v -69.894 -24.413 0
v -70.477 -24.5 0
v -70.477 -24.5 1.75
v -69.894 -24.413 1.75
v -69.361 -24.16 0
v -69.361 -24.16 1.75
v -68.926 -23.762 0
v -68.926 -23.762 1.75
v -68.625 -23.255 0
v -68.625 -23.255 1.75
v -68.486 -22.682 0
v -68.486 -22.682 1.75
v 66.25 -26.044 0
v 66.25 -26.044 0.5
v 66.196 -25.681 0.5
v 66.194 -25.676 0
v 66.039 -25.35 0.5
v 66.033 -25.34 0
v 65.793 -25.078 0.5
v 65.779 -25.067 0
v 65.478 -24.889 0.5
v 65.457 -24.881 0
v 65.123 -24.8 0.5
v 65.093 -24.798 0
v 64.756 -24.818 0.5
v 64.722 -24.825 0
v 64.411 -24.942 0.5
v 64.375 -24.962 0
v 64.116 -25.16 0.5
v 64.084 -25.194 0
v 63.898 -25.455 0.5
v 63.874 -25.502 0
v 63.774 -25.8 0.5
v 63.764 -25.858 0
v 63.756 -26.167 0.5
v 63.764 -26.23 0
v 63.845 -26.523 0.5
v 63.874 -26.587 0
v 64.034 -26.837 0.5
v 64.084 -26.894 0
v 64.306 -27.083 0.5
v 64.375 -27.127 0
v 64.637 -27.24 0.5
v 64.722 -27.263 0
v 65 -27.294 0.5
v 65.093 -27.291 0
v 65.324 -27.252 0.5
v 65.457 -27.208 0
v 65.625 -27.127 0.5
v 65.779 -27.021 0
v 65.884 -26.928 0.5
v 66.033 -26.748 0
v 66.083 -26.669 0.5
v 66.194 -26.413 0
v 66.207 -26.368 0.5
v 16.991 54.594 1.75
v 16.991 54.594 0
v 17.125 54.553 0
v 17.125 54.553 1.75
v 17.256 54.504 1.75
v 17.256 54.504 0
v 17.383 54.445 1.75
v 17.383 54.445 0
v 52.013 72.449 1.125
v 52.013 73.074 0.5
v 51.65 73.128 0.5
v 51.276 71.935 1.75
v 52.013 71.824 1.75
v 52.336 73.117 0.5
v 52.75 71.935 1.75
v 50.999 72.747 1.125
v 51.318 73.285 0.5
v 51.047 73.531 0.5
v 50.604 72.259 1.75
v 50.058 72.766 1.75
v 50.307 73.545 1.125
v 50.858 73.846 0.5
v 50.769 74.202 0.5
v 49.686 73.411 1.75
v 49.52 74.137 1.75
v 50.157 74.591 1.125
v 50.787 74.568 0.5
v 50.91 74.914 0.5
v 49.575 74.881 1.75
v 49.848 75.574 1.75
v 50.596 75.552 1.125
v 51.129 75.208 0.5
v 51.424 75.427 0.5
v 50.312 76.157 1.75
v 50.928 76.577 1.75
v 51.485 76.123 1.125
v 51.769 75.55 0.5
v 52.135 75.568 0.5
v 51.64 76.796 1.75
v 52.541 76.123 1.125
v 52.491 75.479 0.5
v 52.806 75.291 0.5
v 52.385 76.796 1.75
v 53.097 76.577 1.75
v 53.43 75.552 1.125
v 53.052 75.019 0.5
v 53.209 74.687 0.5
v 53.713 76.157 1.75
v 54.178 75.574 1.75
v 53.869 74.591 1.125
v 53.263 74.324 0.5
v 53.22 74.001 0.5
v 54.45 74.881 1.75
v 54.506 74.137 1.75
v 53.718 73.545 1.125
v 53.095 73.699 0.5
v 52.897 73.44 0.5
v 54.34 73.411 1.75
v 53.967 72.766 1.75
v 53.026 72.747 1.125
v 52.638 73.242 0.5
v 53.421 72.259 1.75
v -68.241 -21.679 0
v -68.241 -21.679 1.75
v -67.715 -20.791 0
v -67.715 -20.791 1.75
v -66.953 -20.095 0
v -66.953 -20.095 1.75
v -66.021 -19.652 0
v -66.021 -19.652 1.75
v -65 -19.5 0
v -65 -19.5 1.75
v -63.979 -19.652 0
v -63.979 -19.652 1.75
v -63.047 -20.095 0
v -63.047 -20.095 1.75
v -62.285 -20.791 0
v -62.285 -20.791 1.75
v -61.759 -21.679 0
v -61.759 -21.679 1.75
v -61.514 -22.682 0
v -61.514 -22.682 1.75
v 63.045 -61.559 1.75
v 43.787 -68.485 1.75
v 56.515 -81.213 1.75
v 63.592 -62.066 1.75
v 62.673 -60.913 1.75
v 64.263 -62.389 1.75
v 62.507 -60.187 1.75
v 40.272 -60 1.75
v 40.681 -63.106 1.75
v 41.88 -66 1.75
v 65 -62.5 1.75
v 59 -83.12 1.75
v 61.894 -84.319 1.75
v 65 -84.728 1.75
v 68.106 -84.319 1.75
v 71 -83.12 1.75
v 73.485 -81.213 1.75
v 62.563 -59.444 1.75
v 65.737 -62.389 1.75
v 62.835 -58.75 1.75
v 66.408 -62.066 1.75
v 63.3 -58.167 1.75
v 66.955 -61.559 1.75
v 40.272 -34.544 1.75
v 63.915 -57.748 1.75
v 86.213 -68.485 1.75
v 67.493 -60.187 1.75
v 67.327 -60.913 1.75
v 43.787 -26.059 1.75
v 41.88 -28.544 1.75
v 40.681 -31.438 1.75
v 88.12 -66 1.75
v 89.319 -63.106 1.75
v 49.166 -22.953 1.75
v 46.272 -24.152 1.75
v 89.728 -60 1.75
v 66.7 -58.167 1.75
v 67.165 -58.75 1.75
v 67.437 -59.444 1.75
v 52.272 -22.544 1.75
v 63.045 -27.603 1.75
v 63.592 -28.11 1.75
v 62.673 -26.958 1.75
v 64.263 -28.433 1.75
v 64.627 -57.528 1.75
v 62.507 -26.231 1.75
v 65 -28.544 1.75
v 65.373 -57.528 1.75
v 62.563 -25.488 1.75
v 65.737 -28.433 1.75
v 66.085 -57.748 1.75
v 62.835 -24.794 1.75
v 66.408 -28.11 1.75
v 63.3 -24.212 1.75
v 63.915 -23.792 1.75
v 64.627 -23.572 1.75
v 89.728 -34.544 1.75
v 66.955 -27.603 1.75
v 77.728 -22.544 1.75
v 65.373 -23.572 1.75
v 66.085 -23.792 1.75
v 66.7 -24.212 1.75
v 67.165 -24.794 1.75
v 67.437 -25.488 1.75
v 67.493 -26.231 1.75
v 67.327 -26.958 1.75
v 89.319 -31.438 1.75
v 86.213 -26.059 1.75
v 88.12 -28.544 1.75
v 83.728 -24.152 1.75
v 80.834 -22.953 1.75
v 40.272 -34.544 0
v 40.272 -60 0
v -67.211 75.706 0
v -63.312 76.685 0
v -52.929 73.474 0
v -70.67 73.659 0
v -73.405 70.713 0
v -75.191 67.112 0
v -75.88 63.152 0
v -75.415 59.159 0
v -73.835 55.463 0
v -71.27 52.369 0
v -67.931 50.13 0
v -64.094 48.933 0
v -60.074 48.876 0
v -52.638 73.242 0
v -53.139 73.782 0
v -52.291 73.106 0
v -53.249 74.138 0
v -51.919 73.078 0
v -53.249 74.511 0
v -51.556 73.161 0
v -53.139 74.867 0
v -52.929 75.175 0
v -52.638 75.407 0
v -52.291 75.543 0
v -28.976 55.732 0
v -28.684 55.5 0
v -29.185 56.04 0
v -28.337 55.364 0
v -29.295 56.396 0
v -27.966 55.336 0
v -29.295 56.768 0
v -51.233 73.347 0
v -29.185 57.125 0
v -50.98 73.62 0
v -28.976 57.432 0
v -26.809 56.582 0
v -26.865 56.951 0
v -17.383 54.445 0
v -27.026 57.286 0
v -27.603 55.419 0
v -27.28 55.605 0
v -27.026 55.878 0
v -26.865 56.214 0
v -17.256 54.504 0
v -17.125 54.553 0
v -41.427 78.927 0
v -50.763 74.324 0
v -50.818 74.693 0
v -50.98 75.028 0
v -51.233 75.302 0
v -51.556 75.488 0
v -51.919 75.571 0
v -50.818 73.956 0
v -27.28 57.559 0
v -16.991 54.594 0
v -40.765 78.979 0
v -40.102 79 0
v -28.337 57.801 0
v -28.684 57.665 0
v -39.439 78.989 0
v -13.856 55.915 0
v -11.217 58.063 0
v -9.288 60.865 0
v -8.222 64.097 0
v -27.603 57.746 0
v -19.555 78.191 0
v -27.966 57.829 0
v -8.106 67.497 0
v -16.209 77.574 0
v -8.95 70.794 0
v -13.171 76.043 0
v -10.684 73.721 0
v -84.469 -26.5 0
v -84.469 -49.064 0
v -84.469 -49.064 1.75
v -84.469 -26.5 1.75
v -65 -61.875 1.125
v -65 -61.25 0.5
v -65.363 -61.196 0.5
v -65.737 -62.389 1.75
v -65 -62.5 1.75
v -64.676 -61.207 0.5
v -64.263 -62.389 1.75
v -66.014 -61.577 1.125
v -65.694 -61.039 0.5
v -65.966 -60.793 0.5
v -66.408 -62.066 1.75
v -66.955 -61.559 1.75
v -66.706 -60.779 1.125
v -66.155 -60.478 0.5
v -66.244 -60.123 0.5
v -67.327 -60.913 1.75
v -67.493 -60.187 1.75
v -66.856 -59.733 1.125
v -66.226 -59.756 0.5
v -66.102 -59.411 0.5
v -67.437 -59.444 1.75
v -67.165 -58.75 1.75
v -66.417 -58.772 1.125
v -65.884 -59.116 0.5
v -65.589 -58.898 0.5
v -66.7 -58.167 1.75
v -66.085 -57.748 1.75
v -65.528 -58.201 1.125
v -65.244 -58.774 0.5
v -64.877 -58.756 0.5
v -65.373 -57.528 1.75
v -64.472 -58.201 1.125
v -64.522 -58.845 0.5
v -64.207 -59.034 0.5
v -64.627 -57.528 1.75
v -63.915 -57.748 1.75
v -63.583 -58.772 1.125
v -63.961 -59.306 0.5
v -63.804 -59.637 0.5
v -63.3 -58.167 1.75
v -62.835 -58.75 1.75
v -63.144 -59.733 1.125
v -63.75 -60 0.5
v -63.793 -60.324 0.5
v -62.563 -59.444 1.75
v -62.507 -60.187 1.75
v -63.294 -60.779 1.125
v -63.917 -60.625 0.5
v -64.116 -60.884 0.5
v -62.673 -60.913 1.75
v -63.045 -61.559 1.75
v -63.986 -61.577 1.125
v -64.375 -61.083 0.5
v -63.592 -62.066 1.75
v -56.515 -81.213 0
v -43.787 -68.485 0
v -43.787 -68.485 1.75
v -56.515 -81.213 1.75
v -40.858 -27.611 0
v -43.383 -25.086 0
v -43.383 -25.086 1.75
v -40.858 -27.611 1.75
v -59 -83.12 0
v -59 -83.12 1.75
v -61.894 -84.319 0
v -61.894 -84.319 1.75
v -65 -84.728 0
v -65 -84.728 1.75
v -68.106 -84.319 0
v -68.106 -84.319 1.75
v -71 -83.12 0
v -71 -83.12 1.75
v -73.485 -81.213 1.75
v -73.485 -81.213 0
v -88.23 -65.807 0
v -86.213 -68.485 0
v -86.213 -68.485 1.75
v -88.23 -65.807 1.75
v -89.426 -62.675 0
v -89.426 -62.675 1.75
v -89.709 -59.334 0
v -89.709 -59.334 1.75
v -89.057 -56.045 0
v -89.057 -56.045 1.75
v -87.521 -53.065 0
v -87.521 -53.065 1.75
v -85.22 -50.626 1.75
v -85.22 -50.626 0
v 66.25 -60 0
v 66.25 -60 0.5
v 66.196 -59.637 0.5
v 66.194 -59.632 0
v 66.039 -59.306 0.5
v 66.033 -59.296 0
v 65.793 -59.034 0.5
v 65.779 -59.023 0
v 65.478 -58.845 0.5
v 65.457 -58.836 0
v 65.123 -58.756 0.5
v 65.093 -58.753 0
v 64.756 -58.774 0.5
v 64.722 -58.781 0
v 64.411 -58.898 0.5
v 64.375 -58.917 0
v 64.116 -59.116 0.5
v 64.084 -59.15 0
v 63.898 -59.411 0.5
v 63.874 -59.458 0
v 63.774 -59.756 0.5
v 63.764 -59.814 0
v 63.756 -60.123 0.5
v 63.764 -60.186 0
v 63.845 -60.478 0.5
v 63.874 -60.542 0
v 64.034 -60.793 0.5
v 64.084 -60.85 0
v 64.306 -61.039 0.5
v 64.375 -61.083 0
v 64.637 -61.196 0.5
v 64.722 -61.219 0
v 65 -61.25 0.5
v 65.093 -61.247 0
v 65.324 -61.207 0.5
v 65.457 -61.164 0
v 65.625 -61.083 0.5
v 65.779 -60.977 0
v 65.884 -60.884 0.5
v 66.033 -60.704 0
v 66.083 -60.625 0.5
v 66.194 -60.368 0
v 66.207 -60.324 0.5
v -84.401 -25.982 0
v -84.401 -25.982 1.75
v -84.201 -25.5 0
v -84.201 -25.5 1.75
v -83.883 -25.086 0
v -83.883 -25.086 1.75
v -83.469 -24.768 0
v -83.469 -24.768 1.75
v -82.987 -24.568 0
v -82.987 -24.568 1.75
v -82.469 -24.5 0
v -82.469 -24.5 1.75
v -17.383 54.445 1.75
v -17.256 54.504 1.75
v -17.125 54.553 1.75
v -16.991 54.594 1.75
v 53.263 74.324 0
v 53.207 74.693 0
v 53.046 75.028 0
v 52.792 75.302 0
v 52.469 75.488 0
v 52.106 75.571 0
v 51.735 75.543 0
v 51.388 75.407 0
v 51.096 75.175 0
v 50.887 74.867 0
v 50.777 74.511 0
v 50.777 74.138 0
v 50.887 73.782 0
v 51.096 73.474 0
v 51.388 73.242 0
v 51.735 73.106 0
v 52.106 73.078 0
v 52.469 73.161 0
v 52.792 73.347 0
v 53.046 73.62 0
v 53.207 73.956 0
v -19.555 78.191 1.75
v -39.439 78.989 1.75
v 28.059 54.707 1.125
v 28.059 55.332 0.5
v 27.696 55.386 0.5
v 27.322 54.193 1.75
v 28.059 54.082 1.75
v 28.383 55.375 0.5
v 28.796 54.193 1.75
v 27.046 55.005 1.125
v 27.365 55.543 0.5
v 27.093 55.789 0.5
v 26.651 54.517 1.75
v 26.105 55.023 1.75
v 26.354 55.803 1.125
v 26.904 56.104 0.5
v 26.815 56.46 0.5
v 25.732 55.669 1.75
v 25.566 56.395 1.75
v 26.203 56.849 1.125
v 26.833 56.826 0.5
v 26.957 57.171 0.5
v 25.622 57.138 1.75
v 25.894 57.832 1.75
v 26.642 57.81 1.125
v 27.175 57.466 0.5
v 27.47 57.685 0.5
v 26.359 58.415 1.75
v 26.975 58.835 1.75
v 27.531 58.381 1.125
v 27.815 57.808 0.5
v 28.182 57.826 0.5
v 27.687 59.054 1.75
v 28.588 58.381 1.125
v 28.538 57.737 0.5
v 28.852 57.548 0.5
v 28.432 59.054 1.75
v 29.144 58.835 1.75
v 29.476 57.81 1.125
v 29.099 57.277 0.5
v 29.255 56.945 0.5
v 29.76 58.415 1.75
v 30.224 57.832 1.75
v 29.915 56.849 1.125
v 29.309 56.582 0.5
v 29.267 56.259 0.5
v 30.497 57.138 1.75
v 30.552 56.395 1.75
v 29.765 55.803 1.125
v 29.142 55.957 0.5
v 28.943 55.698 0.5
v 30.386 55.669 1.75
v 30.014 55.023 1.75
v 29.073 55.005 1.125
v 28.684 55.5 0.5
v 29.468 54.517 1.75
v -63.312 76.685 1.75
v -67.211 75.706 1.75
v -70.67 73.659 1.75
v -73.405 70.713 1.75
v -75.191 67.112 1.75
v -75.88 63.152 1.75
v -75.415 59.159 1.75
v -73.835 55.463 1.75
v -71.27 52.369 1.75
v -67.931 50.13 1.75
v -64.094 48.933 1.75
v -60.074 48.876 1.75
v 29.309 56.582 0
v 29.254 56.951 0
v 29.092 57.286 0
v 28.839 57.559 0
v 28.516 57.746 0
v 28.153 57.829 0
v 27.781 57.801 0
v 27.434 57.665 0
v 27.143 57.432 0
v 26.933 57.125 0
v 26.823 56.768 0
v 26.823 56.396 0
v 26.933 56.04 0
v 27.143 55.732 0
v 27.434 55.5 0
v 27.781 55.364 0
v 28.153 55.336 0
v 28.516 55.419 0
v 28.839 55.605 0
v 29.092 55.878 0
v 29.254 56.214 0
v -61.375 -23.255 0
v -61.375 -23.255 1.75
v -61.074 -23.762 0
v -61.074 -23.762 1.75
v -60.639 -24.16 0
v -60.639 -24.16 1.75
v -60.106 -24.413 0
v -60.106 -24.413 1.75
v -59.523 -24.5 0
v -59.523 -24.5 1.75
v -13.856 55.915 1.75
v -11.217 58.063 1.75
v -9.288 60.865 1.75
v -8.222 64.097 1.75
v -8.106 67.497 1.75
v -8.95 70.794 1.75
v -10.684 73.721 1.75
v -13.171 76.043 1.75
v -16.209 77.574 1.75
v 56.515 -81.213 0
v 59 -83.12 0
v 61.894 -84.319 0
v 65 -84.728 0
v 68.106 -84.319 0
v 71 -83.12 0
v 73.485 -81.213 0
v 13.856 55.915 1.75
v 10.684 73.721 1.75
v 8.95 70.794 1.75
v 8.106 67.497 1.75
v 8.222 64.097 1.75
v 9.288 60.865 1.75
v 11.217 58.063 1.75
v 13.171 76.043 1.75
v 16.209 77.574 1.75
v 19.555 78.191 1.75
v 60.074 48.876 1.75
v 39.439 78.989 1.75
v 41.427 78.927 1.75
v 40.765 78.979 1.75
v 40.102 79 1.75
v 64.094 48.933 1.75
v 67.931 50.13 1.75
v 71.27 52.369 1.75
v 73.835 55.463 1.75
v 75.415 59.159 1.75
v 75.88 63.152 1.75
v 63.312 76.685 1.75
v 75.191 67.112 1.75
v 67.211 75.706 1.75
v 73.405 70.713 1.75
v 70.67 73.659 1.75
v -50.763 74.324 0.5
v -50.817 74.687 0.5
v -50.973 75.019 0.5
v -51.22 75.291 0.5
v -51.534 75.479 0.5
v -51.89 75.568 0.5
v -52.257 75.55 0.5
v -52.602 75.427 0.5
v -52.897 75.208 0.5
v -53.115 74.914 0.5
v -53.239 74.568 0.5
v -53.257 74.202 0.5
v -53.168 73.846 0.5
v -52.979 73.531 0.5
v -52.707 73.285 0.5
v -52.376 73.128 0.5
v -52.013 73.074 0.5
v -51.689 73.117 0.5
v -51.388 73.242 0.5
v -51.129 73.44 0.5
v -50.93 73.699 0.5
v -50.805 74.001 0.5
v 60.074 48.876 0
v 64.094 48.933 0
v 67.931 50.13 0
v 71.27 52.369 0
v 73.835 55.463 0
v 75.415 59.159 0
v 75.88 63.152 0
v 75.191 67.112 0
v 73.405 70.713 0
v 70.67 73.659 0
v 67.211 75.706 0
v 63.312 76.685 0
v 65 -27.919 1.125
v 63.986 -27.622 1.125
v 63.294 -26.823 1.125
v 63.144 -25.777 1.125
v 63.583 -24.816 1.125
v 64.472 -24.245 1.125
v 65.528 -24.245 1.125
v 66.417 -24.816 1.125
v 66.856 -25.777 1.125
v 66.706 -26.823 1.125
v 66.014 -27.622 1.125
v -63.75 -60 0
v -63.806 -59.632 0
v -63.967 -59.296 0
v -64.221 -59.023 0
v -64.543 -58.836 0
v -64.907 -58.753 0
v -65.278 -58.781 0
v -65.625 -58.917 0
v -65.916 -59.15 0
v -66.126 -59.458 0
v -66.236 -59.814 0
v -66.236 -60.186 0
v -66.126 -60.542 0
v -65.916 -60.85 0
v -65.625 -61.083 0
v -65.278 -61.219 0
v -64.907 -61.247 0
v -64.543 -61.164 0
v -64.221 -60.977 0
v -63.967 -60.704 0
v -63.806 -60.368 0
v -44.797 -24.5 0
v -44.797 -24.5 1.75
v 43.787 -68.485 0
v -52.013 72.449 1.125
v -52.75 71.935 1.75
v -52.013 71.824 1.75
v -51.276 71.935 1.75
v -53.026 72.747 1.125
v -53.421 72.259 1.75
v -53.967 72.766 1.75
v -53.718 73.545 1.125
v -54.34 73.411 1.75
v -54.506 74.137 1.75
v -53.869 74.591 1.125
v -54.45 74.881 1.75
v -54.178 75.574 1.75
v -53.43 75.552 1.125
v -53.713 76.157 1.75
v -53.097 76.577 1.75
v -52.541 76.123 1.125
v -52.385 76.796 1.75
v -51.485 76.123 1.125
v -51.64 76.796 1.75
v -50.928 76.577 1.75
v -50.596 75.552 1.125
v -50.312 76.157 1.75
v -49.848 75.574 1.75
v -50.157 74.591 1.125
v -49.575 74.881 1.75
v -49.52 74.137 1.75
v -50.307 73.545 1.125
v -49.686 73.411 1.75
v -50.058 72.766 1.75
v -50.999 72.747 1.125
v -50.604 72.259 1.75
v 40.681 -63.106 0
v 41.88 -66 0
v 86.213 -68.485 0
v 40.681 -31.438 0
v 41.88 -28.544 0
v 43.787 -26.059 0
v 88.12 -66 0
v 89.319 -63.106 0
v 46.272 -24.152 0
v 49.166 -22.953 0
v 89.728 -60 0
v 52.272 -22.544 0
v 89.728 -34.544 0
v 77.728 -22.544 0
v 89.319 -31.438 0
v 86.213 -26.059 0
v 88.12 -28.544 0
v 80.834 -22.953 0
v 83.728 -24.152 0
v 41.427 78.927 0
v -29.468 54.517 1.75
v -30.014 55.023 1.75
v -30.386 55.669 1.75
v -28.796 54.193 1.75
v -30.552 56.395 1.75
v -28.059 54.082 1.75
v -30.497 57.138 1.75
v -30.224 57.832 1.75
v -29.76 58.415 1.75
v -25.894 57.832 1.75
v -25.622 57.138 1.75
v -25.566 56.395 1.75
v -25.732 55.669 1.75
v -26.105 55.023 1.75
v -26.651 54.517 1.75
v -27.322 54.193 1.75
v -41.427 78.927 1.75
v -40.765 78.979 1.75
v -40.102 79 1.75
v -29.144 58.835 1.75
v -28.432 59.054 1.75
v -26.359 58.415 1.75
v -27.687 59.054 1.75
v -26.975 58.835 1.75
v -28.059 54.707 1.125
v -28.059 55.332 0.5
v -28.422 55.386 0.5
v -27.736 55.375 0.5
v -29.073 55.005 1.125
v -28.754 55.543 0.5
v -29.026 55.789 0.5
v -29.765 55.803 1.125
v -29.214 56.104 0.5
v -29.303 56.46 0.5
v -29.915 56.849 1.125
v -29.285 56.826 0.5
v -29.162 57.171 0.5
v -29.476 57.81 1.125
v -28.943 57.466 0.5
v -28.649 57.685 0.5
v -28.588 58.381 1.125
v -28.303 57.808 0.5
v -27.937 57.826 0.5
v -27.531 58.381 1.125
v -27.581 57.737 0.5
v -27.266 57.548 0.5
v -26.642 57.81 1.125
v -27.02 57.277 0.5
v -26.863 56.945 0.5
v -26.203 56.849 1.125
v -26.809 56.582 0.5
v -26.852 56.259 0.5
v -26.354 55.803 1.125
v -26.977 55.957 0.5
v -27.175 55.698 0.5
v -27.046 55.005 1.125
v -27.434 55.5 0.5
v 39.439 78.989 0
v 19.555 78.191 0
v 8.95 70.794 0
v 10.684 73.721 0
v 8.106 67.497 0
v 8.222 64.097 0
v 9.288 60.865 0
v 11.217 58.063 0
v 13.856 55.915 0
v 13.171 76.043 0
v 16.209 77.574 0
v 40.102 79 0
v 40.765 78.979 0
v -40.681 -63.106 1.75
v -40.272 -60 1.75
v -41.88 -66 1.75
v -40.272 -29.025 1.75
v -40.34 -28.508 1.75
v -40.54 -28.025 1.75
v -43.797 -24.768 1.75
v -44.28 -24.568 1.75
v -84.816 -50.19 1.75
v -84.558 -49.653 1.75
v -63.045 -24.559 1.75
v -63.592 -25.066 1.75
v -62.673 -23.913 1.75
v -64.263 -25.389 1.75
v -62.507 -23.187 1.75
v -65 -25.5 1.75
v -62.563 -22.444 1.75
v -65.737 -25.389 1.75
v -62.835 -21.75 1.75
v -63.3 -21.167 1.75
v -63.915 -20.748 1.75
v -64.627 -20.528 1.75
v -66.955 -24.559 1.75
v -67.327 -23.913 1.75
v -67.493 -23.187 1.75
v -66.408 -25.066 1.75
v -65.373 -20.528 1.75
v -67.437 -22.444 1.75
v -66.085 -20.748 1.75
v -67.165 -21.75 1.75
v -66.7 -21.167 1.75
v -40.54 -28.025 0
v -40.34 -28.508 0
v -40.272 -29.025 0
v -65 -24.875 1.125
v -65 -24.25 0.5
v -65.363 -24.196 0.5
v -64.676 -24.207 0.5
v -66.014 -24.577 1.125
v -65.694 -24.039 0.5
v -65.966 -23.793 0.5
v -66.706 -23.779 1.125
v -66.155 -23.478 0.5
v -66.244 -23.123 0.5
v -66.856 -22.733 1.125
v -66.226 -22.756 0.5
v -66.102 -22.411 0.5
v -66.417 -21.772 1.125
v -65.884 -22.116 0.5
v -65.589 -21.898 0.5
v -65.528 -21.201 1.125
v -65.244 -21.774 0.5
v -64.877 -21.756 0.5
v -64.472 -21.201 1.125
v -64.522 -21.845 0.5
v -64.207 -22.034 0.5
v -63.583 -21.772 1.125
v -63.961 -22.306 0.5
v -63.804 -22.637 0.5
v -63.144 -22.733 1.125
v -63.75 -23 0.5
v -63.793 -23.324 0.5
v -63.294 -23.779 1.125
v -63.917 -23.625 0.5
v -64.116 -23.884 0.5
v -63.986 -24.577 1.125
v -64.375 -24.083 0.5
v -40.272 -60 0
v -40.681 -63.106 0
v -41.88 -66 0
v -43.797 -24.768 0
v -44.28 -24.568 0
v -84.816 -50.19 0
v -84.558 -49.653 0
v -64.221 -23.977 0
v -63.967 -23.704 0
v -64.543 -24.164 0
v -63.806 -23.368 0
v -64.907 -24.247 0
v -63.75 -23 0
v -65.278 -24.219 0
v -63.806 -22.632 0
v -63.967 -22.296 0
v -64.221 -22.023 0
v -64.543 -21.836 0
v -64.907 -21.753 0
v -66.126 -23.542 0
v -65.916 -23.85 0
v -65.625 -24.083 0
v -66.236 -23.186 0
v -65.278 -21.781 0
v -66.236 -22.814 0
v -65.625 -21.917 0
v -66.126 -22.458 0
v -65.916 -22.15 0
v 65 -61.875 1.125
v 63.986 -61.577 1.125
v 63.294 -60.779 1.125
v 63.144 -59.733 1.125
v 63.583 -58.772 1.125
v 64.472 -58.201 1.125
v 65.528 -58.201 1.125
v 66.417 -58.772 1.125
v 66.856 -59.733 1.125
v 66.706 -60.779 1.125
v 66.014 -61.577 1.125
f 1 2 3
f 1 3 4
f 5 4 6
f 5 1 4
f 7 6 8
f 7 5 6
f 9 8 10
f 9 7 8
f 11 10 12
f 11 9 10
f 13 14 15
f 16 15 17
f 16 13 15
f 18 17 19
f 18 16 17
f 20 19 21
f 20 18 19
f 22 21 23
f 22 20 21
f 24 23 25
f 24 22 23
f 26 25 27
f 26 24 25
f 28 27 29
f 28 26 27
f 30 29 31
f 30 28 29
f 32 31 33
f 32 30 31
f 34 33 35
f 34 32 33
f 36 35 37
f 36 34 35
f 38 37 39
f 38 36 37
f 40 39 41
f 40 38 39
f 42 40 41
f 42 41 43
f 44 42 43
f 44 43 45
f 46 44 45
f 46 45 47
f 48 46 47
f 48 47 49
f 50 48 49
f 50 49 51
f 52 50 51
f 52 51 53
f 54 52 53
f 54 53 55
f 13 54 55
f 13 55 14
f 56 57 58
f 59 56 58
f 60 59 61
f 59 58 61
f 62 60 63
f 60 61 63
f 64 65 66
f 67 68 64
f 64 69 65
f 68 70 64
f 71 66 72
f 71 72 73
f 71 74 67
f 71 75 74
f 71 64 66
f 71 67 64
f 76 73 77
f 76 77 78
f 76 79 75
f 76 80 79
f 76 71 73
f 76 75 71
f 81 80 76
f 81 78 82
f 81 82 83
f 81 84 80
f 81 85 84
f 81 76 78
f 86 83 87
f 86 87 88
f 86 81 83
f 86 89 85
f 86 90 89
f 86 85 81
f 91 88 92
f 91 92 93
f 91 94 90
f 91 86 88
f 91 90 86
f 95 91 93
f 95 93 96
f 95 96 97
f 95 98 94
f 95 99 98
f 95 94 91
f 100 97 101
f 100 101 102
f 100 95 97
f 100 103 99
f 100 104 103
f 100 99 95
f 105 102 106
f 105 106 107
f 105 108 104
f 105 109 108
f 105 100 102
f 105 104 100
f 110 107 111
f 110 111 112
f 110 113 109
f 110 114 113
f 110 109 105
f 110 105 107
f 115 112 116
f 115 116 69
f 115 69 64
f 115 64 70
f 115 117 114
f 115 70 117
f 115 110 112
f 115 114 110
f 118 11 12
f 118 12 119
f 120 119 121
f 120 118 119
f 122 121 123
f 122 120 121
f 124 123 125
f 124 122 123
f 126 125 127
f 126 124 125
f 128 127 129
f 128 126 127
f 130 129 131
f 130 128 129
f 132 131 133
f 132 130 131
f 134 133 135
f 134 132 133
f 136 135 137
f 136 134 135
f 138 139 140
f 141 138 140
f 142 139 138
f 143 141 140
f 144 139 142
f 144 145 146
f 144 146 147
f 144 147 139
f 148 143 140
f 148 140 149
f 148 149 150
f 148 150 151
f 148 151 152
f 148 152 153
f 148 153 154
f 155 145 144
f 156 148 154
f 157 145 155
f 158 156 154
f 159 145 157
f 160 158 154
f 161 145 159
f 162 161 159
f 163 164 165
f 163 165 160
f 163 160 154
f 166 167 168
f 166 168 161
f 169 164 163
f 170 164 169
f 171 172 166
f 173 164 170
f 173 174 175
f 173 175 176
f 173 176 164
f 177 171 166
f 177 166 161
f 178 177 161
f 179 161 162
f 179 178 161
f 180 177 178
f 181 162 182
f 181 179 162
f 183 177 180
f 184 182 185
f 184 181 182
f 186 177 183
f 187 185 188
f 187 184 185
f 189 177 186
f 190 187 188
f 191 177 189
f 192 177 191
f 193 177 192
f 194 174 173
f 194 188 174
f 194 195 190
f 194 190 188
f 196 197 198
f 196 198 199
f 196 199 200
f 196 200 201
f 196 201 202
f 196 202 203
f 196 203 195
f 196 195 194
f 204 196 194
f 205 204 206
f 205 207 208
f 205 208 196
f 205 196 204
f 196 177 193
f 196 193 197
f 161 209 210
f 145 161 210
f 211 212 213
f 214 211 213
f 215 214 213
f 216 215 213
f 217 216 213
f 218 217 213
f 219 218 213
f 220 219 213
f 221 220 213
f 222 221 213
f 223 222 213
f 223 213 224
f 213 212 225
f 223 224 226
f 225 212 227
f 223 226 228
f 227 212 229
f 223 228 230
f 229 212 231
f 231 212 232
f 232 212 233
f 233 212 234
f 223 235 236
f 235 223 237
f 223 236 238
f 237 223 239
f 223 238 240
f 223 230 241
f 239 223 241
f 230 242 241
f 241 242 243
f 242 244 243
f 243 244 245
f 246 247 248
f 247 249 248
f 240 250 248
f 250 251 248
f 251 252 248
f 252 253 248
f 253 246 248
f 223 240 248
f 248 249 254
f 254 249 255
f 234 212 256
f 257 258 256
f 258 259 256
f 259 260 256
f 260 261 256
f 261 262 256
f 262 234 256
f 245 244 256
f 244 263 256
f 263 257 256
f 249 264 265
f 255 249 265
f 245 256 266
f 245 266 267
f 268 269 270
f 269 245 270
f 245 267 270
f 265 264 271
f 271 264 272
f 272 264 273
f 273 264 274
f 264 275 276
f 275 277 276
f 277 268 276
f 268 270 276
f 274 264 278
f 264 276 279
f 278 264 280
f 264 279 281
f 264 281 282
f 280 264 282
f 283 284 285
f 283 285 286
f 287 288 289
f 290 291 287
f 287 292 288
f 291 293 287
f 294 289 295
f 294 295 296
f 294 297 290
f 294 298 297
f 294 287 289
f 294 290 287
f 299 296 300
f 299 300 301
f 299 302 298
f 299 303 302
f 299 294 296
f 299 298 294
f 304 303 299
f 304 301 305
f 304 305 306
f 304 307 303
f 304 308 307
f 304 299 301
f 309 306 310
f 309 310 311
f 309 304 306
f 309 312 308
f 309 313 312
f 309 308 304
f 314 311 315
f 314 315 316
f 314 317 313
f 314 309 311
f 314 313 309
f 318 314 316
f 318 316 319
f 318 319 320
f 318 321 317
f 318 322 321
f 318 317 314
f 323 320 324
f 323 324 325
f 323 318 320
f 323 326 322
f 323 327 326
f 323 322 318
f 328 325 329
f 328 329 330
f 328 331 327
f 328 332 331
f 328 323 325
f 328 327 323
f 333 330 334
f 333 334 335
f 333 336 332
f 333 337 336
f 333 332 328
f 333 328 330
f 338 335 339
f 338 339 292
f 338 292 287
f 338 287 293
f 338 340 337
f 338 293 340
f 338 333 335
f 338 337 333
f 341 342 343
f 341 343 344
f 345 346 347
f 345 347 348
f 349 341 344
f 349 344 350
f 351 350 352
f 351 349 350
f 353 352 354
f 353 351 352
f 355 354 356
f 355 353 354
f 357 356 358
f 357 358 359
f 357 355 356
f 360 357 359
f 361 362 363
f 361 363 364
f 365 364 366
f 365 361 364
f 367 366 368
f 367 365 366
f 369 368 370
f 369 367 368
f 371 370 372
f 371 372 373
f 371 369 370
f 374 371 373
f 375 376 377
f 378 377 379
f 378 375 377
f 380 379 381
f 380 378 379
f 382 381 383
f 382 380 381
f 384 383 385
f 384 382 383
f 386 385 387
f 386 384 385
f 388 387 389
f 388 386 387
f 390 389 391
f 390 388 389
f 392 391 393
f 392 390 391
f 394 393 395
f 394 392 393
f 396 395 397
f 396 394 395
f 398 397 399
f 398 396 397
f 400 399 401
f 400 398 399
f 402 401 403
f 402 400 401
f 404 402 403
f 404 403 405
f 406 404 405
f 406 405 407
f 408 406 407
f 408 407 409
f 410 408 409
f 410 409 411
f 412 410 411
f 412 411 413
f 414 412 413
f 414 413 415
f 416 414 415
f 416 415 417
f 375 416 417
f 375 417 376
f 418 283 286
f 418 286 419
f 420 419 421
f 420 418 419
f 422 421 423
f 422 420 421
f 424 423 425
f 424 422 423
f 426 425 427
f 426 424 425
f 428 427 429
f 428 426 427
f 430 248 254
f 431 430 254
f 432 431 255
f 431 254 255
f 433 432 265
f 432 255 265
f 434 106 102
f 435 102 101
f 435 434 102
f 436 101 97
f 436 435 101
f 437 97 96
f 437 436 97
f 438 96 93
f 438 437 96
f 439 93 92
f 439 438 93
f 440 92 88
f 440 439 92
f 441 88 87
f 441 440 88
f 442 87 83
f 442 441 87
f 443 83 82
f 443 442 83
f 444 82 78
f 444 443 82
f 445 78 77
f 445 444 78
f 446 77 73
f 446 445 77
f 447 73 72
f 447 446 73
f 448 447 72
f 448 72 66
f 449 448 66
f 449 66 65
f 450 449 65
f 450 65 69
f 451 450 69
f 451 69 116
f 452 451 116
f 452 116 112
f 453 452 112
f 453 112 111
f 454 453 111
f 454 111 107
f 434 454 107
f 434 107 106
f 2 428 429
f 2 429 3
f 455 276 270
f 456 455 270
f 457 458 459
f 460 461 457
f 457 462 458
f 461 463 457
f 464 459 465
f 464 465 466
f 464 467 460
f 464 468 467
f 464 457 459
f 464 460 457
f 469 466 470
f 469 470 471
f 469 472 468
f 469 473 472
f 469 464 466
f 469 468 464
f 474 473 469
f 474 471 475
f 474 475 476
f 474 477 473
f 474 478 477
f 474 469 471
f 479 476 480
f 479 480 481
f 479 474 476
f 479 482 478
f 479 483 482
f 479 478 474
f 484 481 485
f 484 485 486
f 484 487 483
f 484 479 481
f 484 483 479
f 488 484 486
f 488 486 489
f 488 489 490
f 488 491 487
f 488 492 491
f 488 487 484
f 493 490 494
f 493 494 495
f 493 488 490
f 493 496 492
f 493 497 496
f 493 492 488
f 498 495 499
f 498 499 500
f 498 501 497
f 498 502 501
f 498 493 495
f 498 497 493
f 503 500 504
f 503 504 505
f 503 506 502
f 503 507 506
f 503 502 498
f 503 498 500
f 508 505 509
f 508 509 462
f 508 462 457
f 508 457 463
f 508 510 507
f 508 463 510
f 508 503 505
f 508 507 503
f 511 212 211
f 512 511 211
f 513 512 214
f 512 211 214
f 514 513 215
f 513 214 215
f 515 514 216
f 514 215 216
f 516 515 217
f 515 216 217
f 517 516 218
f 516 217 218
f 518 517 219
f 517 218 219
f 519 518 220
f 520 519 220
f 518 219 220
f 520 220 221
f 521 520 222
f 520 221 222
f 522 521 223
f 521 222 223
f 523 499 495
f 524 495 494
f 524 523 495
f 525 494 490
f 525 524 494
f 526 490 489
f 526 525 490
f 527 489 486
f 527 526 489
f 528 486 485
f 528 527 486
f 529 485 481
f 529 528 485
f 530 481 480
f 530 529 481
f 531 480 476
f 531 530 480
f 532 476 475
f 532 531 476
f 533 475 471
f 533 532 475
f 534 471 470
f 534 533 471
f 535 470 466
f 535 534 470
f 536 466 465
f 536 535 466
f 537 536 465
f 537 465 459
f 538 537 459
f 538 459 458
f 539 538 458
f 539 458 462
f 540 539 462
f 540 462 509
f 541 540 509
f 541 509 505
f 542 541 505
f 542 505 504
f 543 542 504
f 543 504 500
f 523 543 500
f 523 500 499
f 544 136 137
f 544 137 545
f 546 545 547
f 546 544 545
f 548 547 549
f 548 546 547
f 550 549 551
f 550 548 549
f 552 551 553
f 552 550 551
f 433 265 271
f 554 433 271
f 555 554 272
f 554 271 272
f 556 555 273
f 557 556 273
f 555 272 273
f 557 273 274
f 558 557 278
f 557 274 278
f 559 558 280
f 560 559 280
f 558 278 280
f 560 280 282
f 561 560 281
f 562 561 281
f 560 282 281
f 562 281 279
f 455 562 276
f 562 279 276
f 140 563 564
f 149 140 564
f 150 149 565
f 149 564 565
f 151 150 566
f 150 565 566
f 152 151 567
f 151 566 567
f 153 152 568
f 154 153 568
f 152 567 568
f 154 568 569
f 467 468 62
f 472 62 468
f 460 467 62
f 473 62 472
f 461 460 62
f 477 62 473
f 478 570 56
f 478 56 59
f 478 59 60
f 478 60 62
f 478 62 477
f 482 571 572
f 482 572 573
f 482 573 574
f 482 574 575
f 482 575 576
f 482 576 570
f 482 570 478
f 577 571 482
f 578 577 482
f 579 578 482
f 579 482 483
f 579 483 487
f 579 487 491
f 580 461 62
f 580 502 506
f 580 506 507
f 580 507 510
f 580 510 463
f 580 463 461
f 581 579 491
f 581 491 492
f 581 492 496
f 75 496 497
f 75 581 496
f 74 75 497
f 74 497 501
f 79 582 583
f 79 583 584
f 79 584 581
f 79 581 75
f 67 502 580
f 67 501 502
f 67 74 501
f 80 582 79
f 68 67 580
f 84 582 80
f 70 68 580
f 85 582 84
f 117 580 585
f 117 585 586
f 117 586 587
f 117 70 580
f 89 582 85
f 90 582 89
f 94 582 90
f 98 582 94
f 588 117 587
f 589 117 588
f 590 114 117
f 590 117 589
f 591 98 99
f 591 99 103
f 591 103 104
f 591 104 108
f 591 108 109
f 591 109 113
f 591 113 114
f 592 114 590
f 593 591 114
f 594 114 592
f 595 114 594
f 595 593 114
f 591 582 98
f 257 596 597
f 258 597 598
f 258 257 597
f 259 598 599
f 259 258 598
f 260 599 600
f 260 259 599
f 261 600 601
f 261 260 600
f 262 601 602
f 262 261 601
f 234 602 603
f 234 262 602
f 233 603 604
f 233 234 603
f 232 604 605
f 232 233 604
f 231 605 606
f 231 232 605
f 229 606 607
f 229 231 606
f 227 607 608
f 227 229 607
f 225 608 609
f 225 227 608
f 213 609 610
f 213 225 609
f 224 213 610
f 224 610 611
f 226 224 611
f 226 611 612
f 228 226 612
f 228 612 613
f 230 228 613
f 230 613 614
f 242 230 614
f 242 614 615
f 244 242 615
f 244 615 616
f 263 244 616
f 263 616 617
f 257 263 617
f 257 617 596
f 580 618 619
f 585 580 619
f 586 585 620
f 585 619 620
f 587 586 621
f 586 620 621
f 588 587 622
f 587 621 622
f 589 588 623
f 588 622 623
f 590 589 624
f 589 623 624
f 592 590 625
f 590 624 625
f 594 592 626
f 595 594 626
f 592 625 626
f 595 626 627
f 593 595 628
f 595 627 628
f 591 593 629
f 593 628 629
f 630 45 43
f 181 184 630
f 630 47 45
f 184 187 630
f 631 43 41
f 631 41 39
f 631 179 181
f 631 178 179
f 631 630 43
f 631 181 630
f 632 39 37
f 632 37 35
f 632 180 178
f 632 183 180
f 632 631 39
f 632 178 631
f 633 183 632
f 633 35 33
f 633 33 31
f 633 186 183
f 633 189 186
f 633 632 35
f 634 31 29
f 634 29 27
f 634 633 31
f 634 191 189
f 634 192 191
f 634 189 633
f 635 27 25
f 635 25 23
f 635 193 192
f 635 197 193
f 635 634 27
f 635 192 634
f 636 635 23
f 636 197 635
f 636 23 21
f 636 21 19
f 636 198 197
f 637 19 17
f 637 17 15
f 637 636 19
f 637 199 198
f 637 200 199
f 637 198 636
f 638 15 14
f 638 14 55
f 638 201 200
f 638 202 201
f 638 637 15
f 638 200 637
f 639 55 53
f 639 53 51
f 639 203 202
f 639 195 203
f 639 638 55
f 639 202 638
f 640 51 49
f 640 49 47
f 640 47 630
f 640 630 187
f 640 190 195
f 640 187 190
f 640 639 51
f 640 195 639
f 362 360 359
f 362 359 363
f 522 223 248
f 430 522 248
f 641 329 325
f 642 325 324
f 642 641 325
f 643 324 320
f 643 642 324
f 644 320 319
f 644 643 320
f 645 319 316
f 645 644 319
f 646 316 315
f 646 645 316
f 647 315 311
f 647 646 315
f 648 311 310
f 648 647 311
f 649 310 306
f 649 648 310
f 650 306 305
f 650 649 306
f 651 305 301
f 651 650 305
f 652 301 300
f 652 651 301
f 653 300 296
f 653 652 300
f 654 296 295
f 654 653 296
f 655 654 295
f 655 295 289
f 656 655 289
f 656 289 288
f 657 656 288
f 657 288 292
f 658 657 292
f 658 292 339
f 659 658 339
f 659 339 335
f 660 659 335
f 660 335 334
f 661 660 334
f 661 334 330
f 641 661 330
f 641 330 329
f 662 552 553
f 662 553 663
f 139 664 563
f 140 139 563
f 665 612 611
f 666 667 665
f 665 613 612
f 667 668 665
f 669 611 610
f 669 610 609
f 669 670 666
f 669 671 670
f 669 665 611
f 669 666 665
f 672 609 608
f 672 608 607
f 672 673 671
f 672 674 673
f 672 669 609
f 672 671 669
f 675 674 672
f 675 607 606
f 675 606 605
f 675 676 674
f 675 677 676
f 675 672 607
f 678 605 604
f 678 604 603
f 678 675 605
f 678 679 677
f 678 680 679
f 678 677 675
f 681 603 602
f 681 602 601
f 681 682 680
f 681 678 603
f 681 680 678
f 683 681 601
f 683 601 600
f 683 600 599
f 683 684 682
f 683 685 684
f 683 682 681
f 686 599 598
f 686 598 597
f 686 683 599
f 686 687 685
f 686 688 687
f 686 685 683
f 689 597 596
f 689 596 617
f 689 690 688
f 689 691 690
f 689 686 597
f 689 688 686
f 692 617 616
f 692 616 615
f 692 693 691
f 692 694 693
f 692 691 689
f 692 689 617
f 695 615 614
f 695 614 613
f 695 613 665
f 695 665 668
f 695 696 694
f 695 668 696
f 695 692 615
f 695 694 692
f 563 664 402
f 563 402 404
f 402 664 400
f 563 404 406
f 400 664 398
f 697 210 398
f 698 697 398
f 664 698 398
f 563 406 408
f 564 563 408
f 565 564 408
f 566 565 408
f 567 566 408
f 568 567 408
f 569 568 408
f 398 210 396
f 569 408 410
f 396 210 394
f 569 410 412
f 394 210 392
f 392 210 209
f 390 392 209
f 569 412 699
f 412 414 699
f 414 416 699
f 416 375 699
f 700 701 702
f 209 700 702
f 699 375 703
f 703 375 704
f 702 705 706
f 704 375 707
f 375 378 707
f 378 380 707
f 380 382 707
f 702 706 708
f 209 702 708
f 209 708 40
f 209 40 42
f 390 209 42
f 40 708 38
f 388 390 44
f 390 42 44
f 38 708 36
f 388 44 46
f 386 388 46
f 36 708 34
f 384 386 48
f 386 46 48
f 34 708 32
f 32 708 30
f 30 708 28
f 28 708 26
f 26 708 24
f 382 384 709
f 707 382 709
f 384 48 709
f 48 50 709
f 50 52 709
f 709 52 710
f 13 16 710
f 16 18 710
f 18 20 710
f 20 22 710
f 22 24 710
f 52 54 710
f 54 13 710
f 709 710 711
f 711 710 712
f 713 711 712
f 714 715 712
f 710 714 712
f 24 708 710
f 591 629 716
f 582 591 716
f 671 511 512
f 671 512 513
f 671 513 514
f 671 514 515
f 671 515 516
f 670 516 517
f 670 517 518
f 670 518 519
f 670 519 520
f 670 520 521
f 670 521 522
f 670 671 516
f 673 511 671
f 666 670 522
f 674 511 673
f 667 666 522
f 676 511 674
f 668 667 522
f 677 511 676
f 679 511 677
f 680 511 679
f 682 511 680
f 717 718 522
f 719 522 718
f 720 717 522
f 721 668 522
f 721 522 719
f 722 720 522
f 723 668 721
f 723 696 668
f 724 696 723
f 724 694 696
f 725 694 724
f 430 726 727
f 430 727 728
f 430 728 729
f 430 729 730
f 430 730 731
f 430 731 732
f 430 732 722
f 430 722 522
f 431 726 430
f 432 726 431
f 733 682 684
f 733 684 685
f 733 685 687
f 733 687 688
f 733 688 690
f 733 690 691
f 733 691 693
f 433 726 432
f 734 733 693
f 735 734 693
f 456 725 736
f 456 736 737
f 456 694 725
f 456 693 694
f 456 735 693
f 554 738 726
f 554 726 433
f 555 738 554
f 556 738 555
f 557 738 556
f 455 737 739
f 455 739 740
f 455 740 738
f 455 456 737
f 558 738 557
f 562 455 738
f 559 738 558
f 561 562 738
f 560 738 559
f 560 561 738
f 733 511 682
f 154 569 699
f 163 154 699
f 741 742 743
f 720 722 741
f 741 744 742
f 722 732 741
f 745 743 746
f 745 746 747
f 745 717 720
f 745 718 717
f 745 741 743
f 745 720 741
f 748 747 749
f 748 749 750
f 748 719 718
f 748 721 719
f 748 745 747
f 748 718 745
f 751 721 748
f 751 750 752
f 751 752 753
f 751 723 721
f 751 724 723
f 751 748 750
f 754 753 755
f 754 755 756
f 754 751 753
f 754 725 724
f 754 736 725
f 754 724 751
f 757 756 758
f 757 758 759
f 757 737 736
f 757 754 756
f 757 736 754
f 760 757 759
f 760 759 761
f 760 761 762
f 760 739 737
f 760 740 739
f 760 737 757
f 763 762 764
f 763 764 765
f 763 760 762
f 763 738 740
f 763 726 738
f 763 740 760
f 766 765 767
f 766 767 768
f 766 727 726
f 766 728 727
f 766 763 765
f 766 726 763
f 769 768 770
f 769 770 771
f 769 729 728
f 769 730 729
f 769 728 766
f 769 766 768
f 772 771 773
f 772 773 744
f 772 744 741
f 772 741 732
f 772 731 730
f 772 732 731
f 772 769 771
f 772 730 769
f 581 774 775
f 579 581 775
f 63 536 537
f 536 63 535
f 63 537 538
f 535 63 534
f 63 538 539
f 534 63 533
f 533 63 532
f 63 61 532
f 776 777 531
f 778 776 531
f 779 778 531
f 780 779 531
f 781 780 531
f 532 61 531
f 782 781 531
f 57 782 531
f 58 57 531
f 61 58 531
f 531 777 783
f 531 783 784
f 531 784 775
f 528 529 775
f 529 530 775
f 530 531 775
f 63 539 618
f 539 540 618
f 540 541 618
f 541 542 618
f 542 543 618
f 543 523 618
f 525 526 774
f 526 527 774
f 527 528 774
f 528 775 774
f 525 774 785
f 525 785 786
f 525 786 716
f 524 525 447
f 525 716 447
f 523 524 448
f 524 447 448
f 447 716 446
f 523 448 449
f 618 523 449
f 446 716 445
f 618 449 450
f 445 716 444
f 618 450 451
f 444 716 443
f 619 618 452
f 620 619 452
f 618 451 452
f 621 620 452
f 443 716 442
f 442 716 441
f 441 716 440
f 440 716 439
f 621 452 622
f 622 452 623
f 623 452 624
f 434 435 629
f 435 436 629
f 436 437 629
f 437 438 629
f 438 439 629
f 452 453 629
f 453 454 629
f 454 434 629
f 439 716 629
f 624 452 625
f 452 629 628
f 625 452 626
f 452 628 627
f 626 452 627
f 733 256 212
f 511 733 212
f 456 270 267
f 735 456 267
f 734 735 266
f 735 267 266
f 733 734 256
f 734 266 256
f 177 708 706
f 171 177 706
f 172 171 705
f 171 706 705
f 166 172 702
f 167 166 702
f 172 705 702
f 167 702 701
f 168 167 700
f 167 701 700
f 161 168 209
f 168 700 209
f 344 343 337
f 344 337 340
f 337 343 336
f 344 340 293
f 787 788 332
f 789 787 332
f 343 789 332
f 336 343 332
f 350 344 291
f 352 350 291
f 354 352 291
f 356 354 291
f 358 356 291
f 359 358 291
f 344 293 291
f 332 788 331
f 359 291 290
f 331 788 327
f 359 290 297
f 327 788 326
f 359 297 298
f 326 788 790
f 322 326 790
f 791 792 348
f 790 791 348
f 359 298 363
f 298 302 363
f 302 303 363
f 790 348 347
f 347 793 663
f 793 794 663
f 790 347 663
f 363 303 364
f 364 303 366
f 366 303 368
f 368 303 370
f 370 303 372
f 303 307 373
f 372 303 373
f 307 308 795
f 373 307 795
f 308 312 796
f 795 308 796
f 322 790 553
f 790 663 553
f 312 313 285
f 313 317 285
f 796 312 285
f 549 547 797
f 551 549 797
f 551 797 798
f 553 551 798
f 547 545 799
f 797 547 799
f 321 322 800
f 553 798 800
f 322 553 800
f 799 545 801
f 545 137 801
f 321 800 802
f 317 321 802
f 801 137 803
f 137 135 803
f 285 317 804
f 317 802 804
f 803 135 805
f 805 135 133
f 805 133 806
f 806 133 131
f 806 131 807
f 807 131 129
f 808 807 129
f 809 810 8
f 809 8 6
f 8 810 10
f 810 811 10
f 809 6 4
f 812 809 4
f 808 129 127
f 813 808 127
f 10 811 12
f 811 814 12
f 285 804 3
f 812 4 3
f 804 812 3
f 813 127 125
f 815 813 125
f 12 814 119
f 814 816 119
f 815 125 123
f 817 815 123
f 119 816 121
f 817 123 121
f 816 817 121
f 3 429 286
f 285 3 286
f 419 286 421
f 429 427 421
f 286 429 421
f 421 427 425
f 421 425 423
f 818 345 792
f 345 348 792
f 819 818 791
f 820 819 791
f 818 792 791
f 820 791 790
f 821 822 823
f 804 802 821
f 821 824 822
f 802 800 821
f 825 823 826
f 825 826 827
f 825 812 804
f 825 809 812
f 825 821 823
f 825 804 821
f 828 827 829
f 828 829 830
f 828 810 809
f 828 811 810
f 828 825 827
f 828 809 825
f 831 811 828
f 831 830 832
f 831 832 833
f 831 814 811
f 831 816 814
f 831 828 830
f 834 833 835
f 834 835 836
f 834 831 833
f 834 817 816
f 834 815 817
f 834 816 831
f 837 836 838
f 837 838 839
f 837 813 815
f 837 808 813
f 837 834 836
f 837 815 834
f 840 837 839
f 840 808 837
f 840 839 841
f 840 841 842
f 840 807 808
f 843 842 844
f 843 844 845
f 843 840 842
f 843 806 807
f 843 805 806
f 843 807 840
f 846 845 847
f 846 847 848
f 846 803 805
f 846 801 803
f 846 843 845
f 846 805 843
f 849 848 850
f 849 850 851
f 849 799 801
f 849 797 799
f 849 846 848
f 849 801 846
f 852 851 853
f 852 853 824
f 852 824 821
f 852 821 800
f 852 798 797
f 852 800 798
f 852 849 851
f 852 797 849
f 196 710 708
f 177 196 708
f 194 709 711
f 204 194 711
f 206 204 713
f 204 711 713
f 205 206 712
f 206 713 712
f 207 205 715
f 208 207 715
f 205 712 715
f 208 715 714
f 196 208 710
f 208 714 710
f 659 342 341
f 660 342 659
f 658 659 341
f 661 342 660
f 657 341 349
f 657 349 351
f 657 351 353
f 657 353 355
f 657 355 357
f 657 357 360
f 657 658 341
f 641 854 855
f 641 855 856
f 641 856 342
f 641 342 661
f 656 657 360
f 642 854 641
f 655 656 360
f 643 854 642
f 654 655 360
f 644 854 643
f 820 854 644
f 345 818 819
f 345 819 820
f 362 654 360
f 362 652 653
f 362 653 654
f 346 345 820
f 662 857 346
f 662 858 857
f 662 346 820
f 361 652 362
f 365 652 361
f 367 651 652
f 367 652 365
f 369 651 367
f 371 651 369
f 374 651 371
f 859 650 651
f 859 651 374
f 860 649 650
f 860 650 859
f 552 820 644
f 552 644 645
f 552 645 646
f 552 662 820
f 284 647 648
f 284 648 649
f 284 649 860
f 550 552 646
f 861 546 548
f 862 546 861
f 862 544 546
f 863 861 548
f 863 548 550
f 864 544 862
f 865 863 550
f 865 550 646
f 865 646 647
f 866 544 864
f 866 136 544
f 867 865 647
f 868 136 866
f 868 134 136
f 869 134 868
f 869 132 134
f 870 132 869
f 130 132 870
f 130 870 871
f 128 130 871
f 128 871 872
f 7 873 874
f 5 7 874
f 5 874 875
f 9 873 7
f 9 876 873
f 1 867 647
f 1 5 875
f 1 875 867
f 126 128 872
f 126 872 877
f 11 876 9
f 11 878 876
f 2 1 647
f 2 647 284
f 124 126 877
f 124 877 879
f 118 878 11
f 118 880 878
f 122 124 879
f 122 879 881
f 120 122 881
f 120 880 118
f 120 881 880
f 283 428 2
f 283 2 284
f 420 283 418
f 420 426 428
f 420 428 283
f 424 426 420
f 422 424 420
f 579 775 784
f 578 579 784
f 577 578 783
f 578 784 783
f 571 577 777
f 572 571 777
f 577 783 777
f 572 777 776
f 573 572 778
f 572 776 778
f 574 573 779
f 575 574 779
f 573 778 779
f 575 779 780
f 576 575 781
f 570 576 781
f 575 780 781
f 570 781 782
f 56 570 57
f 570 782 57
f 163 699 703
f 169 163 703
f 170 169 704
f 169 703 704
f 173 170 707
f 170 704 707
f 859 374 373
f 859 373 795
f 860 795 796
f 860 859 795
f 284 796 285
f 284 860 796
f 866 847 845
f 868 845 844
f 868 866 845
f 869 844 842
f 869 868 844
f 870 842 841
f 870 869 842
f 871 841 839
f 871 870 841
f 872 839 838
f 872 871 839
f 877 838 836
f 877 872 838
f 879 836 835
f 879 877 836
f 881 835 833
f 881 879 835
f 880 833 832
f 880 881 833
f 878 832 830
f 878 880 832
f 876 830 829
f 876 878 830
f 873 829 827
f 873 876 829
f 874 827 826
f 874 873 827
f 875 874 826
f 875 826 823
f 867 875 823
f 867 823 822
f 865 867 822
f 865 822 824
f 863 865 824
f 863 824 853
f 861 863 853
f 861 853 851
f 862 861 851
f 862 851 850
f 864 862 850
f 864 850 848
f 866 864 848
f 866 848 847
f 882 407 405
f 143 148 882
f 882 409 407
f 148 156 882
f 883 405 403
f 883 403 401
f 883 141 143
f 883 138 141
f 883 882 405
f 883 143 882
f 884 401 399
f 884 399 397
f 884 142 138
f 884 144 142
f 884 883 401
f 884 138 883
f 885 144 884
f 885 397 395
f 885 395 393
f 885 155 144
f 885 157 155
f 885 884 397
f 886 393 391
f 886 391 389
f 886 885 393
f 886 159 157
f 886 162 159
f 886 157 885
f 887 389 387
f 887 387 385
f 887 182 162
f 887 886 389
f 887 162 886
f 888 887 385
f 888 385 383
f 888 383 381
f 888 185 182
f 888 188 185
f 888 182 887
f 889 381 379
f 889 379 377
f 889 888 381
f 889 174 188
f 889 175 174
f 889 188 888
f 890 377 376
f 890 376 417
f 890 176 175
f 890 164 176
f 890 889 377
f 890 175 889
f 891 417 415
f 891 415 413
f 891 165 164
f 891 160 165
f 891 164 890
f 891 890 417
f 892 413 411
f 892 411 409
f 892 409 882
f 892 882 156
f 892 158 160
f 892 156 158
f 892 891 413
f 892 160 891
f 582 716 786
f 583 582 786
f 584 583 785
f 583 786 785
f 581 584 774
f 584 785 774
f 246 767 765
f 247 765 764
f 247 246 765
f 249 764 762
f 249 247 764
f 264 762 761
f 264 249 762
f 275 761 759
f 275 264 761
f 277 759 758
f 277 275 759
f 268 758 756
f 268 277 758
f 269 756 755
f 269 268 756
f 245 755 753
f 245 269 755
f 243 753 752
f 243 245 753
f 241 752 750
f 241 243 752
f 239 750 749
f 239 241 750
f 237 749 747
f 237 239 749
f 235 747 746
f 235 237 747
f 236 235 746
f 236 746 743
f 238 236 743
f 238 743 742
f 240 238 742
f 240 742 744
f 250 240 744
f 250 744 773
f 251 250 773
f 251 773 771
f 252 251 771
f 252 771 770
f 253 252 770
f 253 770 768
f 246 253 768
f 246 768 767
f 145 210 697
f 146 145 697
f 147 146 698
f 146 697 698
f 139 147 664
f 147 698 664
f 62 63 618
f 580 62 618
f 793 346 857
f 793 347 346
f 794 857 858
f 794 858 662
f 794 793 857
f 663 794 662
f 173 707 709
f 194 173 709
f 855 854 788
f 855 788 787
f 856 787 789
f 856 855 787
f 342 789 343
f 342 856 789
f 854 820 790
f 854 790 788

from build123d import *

# Parameters (mm, degrees)
SKETCH1_R                                      = 1.25
BOSS_EXTRUDE1_DEPTH                            = 1.75
BOSS_EXTRUDE1_2_DEPTH                          = 1.75
BOSS_EXTRUDE1_3_DEPTH                          = 1.75
BOSS_EXTRUDE1_4_DEPTH                          = 1.75
CSK_FOR_M2_5_FLAT_HEAD_MACHINE_SCREW1_AT_COUNT = 2
CSK_FOR_M2_5_FLAT_HEAD_MACHINE_SCREW1_AT_PITCH = 37
CSK_FOR_M2_5_FLAT_HEAD_MACHINE_SCREW_2_COUNT   = 2
CSK_FOR_M2_5_FLAT_HEAD_MACHINE_SCREW_2_PITCH   = 98.187021999
CSK_FOR_M2_5_FLAT_HEAD_MACHINE_SCREW_3_COUNT   = 2
CSK_FOR_M2_5_FLAT_HEAD_MACHINE_SCREW_3_PITCH   = 87.737908903
CSK_FOR_M2_5_FLAT_HEAD_MACHINE_SCREW_4_COUNT   = 2
CSK_FOR_M2_5_FLAT_HEAD_MACHINE_SCREW_4_PITCH   = 152.197291874
CSK_FOR_M2_5_FLAT_HEAD_MACHINE_SCREW_5_COUNT   = 2
CSK_FOR_M2_5_FLAT_HEAD_MACHINE_SCREW_5_PITCH   = 122.44732595
CSK_FOR_M2_5_FLAT_HEAD_MACHINE_SCREW_6_COUNT   = 2
CSK_FOR_M2_5_FLAT_HEAD_MACHINE_SCREW_6_PITCH   = 130.035636981
CSK_FOR_M2_5_FLAT_HEAD_MACHINE_SCREW_7_COUNT   = 2
CSK_FOR_M2_5_FLAT_HEAD_MACHINE_SCREW_7_PITCH   = 135.162864723
FILLET1_R                                      = 2


with BuildPart() as part:
    # Sketch1 → Boss-Extrude1 (new body)
    with BuildSketch(Plane.XY):
        with BuildLine():
            Line((-43.968986643, -24.5), (-40.272077939, -28.196908704))
            Line((-40.272077939, -28.196908704), (-40.272077939, -60))
            ThreePointArc((-40.272077939, -60), (-41.185523549, -64.592201188), (-43.786796564, -68.485281374))
            Line((-43.786796564, -68.485281374), (-56.514718626, -81.213203436))
            ThreePointArc((-56.514718626, -81.213203436), (-65, -84.727922061), (-73.485281374, -81.213203436))
            Line((-73.485281374, -81.213203436), (-86.213203436, -68.485281374))
            ThreePointArc((-86.213203436, -68.485281374), (-89.709417347, -59.333838811), (-85.220263131, -50.626376085))
            ThreePointArc((-85.220263131, -50.626376085), (-84.666565074, -49.930867504), (-84.468986643, -49.064105433))
            Line((-84.468986643, -49.064105433), (-84.468986643, -26.5))
            ThreePointArc((-84.468986643, -26.5), (-83.883200205, -25.085786438), (-82.468986643, -24.5))
            Line((-82.468986643, -24.5), (-70.477225575, -24.5))
            ThreePointArc((-70.477225575, -24.5), (-69.12882585, -23.977097892), (-68.485507184, -22.681818182))
            ThreePointArc((-68.485507184, -22.681818182), (-65, -19.5), (-61.514492816, -22.681818182))
            ThreePointArc((-61.514492816, -22.681818182), (-60.87117415, -23.977097892), (-59.522774425, -24.5))
            Line((-59.522774425, -24.5), (-43.968986643, -24.5))
        make_face()
        with Locations((-65, -60)):
            Circle(SKETCH1_R, mode=Mode.SUBTRACT)
        with Locations((-65, -23)):
            Circle(SKETCH1_R, mode=Mode.SUBTRACT)
    extrude(amount=BOSS_EXTRUDE1_DEPTH)

    # Sketch3 → CSK for M2.5 Flat Head Machine Screw1 (revolve, cut)
    with BuildSketch(Plane(origin=(-65, -23, 1.75), x_dir=(0, -1, 0), z_dir=(1, 0, 0))):
        Polygon((0, 0), (0, 1.75), (1.25, 1.75), (1.25, 1.25), (2.5, 0), align=None)
    csk_for_m2_5_flat_head_machine_screw1 = revolve(axis=Axis((-65, -23, 8.1), (0, 0, -1)), mode=Mode.SUBTRACT)

    # CSK for M2.5 Flat Head Machine Screw1 at: CSK for M2.5 Flat Head Machine Screw1 ×2
    with Locations(*[(0, -i * CSK_FOR_M2_5_FLAT_HEAD_MACHINE_SCREW1_AT_PITCH, 0) for i in range(1, CSK_FOR_M2_5_FLAT_HEAD_MACHINE_SCREW1_AT_COUNT)]):
        add(csk_for_m2_5_flat_head_machine_screw1, mode=Mode.SUBTRACT)

    # Fillet1
    fillet1_edges = [part.edges().sort_by_distance(p)[0] for p in [
        (-43.968986643, -24.5, 0.875),
        (-40.272077939, -28.196908704, 0.875),
    ]]
    fillet(fillet1_edges, radius=FILLET1_R)


with BuildPart() as body_2:
    # Sketch1 → Boss-Extrude1 2 (new body)
    with BuildSketch(Plane.XY):
        with BuildLine():
            Line((89.727922061, -60), (89.727922061, -34.544155877))
            ThreePointArc((89.727922061, -34.544155877), (86.213203436, -26.058874503), (77.727922061, -22.544155877))
            Line((77.727922061, -22.544155877), (52.272077939, -22.544155877))
            ThreePointArc((52.272077939, -22.544155877), (43.786796564, -26.058874503), (40.272077939, -34.544155877))
            Line((40.272077939, -34.544155877), (40.272077939, -60))
            ThreePointArc((40.272077939, -60), (41.185523549, -64.592201188), (43.786796564, -68.485281374))
            Line((43.786796564, -68.485281374), (56.514718626, -81.213203436))
            ThreePointArc((56.514718626, -81.213203436), (65, -84.727922061), (73.485281374, -81.213203436))
            Line((73.485281374, -81.213203436), (86.213203436, -68.485281374))
            ThreePointArc((86.213203436, -68.485281374), (88.814476451, -64.592201188), (89.727922061, -60))
        make_face()
        with Locations((65, -60)):
            Circle(SKETCH1_R, mode=Mode.SUBTRACT)
        with Locations((65, -26.044155877)):
            Circle(SKETCH1_R, mode=Mode.SUBTRACT)
    extrude(amount=BOSS_EXTRUDE1_2_DEPTH)

    # CSK for M2.5 Flat Head Machine Screw 6: CSK for M2.5 Flat Head Machine Screw1 ×2
    with Locations(*[Vector(0.9997259445053818, -0.023410166227997686, 0) * (i * CSK_FOR_M2_5_FLAT_HEAD_MACHINE_SCREW_6_PITCH) for i in range(1, CSK_FOR_M2_5_FLAT_HEAD_MACHINE_SCREW_6_COUNT)]):
        add(csk_for_m2_5_flat_head_machine_screw1, mode=Mode.SUBTRACT)

    # CSK for M2.5 Flat Head Machine Screw 7: CSK for M2.5 Flat Head Machine Screw1 ×2
    with Locations(*[Vector(0.9618026391115247, -0.2737438280548188, 0) * (i * CSK_FOR_M2_5_FLAT_HEAD_MACHINE_SCREW_7_PITCH) for i in range(1, CSK_FOR_M2_5_FLAT_HEAD_MACHINE_SCREW_7_COUNT)]):
        add(csk_for_m2_5_flat_head_machine_screw1, mode=Mode.SUBTRACT)


with BuildPart() as body_3:
    # Sketch1 → Boss-Extrude1 3 (new body)
    with BuildSketch(Plane.XY):
        with BuildLine():
            Line((63.312201165, 76.685087798), (41.426741745, 78.92711054))
            ThreePointArc((41.426741745, 78.92711054), (40.43395974, 78.993272632), (39.438985809, 78.988754879))
            Line((39.438985809, 78.988754879), (19.555221001, 78.191323348))
            ThreePointArc((19.555221001, 78.191323348), (8.106309017, 67.497232972), (16.991142128, 54.593710385))
            ThreePointArc((16.991142128, 54.593710385), (17.191171735, 54.529840537), (17.383402479, 54.445350645))
            Line((17.383402479, 54.445350645), (60.074279954, 48.875627711))
            ThreePointArc((60.074279954, 48.875627711), (75.791518016, 61.138861966), (63.312201165, 76.685087798))
        make_face()
        with Locations((52.012786019, 74.324321534)):
            Circle(SKETCH1_R, mode=Mode.SUBTRACT)
        with Locations((28.059257591, 56.582172683)):
            Circle(SKETCH1_R, mode=Mode.SUBTRACT)
    extrude(amount=BOSS_EXTRUDE1_3_DEPTH)

    # CSK for M2.5 Flat Head Machine Screw 4: CSK for M2.5 Flat Head Machine Screw1 ×2
    with Locations(*[Vector(0.7688230491999356, 0.6394615852566231, 0) * (i * CSK_FOR_M2_5_FLAT_HEAD_MACHINE_SCREW_4_PITCH) for i in range(1, CSK_FOR_M2_5_FLAT_HEAD_MACHINE_SCREW_4_COUNT)]):
        add(csk_for_m2_5_flat_head_machine_screw1, mode=Mode.SUBTRACT)

    # CSK for M2.5 Flat Head Machine Screw 5: CSK for M2.5 Flat Head Machine Screw1 ×2
    with Locations(*[Vector(0.7599942005192046, 0.6499298540436306, 0) * (i * CSK_FOR_M2_5_FLAT_HEAD_MACHINE_SCREW_5_PITCH) for i in range(1, CSK_FOR_M2_5_FLAT_HEAD_MACHINE_SCREW_5_COUNT)]):
        add(csk_for_m2_5_flat_head_machine_screw1, mode=Mode.SUBTRACT)


with BuildPart() as body_4:
    # Sketch1 → Boss-Extrude1 4 (new body)
    with BuildSketch(Plane.XY):
        with BuildLine():
            Line((-41.426741745, 78.92711054), (-63.312201165, 76.685087798))
            ThreePointArc((-63.312201165, 76.685087798), (-75.791518016, 61.138861966), (-60.074279954, 48.875627711))
            Line((-60.074279954, 48.875627711), (-17.383402479, 54.445350645))
            ThreePointArc((-17.383402479, 54.445350645), (-17.191171735, 54.529840537), (-16.991142128, 54.593710385))
            ThreePointArc((-16.991142128, 54.593710385), (-8.106309017, 67.497232972), (-19.555221001, 78.191323348))
            Line((-19.555221001, 78.191323348), (-39.438985809, 78.988754879))
            ThreePointArc((-39.438985809, 78.988754879), (-40.43395974, 78.993272632), (-41.426741745, 78.92711054))
        make_face()
        with Locations((-28.059257591, 56.582172683)):
            Circle(SKETCH1_R, mode=Mode.SUBTRACT)
        with Locations((-52.012786019, 74.324321534)):
            Circle(SKETCH1_R, mode=Mode.SUBTRACT)
    extrude(amount=BOSS_EXTRUDE1_4_DEPTH)

    # CSK for M2.5 Flat Head Machine Screw 2: CSK for M2.5 Flat Head Machine Screw1 ×2
    with Locations(*[Vector(0.1322701688752495, 0.9912137016938946, 0) * (i * CSK_FOR_M2_5_FLAT_HEAD_MACHINE_SCREW_2_PITCH) for i in range(1, CSK_FOR_M2_5_FLAT_HEAD_MACHINE_SCREW_2_COUNT)]):
        add(csk_for_m2_5_flat_head_machine_screw1, mode=Mode.SUBTRACT)

    # CSK for M2.5 Flat Head Machine Screw 3: CSK for M2.5 Flat Head Machine Screw1 ×2
    with Locations(*[Vector(0.42103513602016673, 0.9070443287053174, 0) * (i * CSK_FOR_M2_5_FLAT_HEAD_MACHINE_SCREW_3_PITCH) for i in range(1, CSK_FOR_M2_5_FLAT_HEAD_MACHINE_SCREW_3_COUNT)]):
        add(csk_for_m2_5_flat_head_machine_screw1, mode=Mode.SUBTRACT)


solid = Compound([part.part, body_2.part, body_3.part, body_4.part])
